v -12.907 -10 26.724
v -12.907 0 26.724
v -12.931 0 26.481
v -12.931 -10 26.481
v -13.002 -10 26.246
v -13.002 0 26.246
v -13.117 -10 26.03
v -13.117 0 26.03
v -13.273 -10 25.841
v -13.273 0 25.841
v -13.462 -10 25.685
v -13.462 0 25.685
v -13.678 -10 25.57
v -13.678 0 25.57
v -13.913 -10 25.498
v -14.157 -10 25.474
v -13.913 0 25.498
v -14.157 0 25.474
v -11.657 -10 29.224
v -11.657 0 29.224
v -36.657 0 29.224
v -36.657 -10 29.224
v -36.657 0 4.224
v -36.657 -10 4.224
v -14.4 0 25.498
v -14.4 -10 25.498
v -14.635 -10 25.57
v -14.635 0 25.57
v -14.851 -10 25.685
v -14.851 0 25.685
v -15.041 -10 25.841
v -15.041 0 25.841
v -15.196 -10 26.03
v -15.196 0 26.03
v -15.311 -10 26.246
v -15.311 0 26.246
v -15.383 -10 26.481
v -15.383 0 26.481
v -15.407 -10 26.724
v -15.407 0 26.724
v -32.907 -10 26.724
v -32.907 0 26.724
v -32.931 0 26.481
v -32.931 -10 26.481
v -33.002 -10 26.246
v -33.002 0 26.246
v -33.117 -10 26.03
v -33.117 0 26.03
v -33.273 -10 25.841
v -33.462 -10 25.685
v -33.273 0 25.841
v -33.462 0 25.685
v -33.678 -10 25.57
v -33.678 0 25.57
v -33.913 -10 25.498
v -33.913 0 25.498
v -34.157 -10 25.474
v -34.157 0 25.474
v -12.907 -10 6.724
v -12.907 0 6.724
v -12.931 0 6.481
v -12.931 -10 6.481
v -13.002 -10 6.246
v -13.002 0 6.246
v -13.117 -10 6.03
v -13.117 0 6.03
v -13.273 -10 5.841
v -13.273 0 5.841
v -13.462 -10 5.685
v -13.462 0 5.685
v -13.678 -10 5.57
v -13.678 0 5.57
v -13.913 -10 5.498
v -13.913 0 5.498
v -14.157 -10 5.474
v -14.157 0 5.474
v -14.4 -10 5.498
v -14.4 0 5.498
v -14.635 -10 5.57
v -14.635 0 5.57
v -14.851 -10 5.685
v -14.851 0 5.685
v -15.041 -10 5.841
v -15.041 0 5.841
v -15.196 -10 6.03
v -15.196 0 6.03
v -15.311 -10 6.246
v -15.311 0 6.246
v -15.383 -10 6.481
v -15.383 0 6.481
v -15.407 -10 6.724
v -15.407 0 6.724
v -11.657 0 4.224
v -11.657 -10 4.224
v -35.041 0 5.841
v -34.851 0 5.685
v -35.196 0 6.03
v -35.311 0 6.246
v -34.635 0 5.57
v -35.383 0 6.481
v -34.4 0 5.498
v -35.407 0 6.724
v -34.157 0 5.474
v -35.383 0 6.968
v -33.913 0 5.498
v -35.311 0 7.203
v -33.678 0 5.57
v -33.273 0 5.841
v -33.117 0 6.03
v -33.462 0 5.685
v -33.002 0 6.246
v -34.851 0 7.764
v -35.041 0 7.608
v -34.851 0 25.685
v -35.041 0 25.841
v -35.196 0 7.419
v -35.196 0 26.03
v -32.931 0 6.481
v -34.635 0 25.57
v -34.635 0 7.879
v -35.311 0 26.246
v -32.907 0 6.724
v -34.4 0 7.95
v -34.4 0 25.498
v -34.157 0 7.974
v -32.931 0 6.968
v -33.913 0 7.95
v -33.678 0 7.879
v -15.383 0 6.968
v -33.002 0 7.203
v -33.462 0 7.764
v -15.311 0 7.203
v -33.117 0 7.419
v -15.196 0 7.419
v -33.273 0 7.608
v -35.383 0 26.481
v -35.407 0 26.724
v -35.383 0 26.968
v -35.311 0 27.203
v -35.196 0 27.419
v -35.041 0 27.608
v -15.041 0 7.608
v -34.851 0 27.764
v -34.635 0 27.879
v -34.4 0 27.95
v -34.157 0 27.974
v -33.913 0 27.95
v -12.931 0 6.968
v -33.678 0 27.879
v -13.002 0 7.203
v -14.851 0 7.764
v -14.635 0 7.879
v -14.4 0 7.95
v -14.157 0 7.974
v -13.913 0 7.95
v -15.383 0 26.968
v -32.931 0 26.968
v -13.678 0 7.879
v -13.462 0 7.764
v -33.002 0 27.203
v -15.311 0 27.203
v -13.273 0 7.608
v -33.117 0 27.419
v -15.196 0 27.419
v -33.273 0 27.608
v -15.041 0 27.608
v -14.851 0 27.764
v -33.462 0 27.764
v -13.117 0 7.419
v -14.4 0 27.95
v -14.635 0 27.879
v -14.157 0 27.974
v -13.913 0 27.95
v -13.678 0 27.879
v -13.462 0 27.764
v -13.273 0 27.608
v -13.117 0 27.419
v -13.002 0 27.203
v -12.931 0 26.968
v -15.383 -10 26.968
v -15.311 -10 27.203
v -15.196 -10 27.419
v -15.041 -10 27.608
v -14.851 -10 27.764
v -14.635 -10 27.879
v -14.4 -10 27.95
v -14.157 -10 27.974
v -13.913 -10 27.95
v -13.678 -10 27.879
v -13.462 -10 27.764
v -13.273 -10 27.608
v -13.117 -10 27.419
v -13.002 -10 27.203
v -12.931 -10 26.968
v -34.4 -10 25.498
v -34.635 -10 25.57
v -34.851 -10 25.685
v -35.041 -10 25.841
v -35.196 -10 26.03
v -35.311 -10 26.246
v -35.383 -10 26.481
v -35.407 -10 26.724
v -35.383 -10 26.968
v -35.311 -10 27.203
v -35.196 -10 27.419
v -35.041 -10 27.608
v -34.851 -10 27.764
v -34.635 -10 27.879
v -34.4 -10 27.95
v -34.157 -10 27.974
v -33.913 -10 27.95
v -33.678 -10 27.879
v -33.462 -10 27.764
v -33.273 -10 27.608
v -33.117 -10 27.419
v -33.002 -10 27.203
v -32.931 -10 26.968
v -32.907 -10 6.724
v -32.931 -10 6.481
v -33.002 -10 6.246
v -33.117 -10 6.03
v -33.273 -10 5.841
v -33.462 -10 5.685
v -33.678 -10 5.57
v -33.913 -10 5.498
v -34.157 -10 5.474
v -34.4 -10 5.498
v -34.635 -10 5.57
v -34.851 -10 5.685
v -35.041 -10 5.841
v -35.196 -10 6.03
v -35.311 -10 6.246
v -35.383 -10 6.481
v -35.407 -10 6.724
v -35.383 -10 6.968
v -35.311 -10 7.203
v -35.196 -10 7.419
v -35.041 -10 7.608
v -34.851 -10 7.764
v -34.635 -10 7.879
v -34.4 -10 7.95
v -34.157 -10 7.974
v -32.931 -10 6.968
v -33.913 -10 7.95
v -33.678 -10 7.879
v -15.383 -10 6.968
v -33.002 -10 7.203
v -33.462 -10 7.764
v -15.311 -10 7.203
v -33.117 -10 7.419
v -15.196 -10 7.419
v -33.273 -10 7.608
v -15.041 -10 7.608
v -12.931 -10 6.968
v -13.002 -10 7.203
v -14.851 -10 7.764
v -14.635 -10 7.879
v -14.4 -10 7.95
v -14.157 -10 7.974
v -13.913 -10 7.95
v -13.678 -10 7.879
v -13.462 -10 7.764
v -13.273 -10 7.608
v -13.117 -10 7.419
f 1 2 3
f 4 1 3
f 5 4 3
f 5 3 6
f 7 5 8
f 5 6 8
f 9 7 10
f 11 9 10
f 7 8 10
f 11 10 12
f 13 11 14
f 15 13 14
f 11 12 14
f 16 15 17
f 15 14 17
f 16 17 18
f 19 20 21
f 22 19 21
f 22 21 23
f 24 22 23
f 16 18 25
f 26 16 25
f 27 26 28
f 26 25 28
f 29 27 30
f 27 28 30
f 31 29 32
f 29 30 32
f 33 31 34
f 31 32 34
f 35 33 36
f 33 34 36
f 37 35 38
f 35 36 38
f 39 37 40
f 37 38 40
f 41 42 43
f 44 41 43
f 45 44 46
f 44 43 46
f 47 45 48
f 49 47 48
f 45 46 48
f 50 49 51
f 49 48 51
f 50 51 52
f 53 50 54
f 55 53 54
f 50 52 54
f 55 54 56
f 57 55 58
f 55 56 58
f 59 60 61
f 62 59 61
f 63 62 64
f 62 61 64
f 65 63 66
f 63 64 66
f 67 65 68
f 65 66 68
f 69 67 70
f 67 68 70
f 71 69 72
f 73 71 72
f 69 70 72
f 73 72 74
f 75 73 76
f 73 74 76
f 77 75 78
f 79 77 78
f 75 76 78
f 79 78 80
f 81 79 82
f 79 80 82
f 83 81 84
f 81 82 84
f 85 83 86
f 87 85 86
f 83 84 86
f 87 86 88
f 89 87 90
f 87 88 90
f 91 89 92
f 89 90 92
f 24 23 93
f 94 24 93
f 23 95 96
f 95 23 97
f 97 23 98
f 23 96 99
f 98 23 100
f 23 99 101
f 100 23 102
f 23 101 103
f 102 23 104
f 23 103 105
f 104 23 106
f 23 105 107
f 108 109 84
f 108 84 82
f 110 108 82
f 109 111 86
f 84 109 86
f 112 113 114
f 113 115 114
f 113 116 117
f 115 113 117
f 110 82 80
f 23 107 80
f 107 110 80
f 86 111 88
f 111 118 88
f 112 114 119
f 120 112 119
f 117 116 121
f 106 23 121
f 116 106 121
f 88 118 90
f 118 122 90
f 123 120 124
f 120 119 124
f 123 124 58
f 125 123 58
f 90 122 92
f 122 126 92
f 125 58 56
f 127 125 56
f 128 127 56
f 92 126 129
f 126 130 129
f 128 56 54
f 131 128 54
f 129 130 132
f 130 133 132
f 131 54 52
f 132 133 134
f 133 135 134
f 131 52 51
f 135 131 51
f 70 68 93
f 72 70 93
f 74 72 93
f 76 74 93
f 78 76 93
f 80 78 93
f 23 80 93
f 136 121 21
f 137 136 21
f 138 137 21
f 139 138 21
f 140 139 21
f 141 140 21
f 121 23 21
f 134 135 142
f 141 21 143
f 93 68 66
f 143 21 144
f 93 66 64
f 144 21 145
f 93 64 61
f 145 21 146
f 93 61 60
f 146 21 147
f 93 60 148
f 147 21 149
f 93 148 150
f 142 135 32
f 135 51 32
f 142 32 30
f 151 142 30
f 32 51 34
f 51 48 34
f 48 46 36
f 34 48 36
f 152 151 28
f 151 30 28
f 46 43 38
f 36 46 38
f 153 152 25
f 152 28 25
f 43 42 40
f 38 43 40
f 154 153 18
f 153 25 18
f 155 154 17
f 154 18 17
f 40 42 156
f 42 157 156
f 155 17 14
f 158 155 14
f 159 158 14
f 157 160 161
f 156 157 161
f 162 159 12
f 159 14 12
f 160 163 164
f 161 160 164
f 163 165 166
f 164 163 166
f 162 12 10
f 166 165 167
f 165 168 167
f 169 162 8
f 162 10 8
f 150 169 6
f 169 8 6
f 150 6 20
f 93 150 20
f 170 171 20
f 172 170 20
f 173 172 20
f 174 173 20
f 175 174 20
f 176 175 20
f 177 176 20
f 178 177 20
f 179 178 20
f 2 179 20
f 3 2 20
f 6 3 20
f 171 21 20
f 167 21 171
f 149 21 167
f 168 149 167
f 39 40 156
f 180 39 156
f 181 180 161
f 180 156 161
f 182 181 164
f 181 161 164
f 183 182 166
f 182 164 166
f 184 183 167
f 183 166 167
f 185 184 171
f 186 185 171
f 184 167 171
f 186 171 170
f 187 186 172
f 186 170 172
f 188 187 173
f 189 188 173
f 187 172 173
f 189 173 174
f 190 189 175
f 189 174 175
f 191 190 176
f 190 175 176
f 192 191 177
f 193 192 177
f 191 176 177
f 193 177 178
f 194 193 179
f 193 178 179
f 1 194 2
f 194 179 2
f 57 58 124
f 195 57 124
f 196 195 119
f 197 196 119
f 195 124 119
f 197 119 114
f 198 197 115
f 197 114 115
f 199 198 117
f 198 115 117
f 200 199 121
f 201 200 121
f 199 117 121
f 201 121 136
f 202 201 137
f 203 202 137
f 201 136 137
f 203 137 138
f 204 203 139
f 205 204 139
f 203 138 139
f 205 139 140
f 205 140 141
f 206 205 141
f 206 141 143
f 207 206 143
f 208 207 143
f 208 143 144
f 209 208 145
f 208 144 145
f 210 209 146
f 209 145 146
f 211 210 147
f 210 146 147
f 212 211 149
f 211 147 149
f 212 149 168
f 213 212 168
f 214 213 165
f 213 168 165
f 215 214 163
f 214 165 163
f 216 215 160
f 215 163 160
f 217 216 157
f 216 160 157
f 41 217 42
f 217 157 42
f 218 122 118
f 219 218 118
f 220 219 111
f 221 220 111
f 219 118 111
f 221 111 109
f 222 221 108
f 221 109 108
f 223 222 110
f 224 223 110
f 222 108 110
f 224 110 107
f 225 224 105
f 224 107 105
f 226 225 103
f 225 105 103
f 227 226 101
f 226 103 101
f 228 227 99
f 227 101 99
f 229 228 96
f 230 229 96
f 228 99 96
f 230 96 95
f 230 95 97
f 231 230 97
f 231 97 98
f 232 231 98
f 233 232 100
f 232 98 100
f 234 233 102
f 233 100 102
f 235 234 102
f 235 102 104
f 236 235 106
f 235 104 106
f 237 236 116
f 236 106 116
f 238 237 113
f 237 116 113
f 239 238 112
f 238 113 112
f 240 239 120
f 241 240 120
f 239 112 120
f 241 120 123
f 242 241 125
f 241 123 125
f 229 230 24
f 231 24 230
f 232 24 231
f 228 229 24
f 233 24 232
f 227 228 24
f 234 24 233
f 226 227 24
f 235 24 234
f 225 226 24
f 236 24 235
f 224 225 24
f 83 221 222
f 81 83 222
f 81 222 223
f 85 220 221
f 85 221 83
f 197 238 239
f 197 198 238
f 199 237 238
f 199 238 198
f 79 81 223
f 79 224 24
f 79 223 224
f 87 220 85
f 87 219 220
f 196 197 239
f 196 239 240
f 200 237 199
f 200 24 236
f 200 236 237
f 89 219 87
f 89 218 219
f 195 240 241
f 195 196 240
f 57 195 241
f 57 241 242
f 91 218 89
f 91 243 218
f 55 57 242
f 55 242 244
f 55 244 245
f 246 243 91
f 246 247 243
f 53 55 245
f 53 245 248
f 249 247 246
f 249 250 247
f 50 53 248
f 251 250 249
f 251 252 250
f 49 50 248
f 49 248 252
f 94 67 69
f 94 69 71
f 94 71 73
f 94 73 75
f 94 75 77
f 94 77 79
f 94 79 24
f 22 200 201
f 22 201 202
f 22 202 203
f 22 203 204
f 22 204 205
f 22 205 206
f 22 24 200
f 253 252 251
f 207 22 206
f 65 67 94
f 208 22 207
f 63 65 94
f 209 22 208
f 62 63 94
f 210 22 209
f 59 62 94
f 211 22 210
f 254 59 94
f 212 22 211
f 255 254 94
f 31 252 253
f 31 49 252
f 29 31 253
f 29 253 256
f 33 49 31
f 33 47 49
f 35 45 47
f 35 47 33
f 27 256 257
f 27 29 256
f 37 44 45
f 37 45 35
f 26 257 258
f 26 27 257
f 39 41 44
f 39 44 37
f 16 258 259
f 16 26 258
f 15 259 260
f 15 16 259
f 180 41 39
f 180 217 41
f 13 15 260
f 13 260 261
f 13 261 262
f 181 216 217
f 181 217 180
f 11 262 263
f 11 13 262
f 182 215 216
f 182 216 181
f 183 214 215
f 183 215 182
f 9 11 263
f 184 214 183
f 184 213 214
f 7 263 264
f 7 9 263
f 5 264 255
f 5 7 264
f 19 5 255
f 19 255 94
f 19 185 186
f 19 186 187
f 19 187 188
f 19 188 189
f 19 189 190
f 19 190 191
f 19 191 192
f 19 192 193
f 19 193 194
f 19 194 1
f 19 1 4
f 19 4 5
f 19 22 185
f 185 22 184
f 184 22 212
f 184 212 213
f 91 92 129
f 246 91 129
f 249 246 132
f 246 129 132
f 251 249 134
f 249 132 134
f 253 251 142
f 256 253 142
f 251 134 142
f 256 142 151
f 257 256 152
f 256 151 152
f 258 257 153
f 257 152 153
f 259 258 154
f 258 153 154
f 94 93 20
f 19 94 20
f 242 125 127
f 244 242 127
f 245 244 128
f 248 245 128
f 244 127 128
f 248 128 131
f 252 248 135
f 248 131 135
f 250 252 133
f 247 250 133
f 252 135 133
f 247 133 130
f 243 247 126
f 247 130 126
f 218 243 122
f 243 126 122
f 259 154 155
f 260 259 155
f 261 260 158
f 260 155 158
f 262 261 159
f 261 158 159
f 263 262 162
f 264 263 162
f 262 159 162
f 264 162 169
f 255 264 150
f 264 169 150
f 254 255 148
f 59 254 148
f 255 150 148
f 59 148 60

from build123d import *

# Parameters (mm, degrees)
F1_DEPTH = 10


with BuildPart() as f1:
    # F0 (on Front) → F1 (new body)
    with BuildSketch(Plane.XZ):
        Polygon((-11.6566279531, 4.2243999988), (-11.6566279531, 16.7243999988), (-11.6566279531, 29.2243999988), (-36.6566279531, 29.2243999988), (-36.6566279531, 4.2243999988), align=None)
        with BuildLine():
            ThreePointArc((-34.1566279531, 25.4743999988), (-35.0405114295, 27.6082834753), (-32.9066279531, 26.7243999988))
            Line((-32.9066279531, 26.7243999988), (-15.4066279531, 26.7243999988))
            ThreePointArc((-15.4066279531, 26.7243999988), (-14.1566279531, 27.9743999988), (-12.9066279531, 26.7243999988))
            ThreePointArc((-12.9066279531, 26.7243999988), (-13.2727444766, 25.8405165223), (-14.1566279531, 25.4743999988))
            Line((-14.1566279531, 25.4743999988), (-14.1566279531, 16.7243999988))
            Line((-14.1566279531, 16.7243999988), (-14.1566279531, 7.9743999988))
            ThreePointArc((-14.1566279531, 7.9743999988), (-13.2727444766, 7.6082834753), (-12.9066279531, 6.7243999988))
            ThreePointArc((-12.9066279531, 6.7243999988), (-14.1566279531, 5.4743999988), (-15.4066279531, 6.7243999988))
            Line((-15.4066279531, 6.7243999988), (-32.9066279531, 6.7243999988))
            ThreePointArc((-32.9066279531, 6.7243999988), (-35.0405114295, 5.8405165223), (-34.1566279531, 7.9743999988))
            Line((-34.1566279531, 7.9743999988), (-34.1566279531, 16.7243999988))
            Line((-34.1566279531, 16.7243999988), (-34.1566279531, 25.4743999988))
        make_face(mode=Mode.SUBTRACT)
        with BuildLine():
            Line((-14.1566279531, 16.7243999988), (-34.1566279531, 16.7243999988))
            Line((-34.1566279531, 16.7243999988), (-34.1566279531, 7.9743999988))
            ThreePointArc((-34.1566279531, 7.9743999988), (-33.2727444766, 7.6082834753), (-32.9066279531, 6.7243999988))
            Line((-32.9066279531, 6.7243999988), (-15.4066279531, 6.7243999988))
            ThreePointArc((-15.4066279531, 6.7243999988), (-15.0405114295, 7.6082834753), (-14.1566279531, 7.9743999988))
            Line((-14.1566279531, 7.9743999988), (-14.1566279531, 16.7243999988))
        make_face()
        with BuildLine():
            Line((-15.4066279531, 26.7243999988), (-32.9066279531, 26.7243999988))
            ThreePointArc((-32.9066279531, 26.7243999988), (-33.2727444766, 25.8405165223), (-34.1566279531, 25.4743999988))
            Line((-34.1566279531, 25.4743999988), (-34.1566279531, 16.7243999988))
            Line((-34.1566279531, 16.7243999988), (-14.1566279531, 16.7243999988))
            Line((-14.1566279531, 16.7243999988), (-14.1566279531, 25.4743999988))
            ThreePointArc((-14.1566279531, 25.4743999988), (-15.0405114295, 25.8405165223), (-15.4066279531, 26.7243999988))
        make_face()
    extrude(amount=F1_DEPTH)


solid = f1.part
